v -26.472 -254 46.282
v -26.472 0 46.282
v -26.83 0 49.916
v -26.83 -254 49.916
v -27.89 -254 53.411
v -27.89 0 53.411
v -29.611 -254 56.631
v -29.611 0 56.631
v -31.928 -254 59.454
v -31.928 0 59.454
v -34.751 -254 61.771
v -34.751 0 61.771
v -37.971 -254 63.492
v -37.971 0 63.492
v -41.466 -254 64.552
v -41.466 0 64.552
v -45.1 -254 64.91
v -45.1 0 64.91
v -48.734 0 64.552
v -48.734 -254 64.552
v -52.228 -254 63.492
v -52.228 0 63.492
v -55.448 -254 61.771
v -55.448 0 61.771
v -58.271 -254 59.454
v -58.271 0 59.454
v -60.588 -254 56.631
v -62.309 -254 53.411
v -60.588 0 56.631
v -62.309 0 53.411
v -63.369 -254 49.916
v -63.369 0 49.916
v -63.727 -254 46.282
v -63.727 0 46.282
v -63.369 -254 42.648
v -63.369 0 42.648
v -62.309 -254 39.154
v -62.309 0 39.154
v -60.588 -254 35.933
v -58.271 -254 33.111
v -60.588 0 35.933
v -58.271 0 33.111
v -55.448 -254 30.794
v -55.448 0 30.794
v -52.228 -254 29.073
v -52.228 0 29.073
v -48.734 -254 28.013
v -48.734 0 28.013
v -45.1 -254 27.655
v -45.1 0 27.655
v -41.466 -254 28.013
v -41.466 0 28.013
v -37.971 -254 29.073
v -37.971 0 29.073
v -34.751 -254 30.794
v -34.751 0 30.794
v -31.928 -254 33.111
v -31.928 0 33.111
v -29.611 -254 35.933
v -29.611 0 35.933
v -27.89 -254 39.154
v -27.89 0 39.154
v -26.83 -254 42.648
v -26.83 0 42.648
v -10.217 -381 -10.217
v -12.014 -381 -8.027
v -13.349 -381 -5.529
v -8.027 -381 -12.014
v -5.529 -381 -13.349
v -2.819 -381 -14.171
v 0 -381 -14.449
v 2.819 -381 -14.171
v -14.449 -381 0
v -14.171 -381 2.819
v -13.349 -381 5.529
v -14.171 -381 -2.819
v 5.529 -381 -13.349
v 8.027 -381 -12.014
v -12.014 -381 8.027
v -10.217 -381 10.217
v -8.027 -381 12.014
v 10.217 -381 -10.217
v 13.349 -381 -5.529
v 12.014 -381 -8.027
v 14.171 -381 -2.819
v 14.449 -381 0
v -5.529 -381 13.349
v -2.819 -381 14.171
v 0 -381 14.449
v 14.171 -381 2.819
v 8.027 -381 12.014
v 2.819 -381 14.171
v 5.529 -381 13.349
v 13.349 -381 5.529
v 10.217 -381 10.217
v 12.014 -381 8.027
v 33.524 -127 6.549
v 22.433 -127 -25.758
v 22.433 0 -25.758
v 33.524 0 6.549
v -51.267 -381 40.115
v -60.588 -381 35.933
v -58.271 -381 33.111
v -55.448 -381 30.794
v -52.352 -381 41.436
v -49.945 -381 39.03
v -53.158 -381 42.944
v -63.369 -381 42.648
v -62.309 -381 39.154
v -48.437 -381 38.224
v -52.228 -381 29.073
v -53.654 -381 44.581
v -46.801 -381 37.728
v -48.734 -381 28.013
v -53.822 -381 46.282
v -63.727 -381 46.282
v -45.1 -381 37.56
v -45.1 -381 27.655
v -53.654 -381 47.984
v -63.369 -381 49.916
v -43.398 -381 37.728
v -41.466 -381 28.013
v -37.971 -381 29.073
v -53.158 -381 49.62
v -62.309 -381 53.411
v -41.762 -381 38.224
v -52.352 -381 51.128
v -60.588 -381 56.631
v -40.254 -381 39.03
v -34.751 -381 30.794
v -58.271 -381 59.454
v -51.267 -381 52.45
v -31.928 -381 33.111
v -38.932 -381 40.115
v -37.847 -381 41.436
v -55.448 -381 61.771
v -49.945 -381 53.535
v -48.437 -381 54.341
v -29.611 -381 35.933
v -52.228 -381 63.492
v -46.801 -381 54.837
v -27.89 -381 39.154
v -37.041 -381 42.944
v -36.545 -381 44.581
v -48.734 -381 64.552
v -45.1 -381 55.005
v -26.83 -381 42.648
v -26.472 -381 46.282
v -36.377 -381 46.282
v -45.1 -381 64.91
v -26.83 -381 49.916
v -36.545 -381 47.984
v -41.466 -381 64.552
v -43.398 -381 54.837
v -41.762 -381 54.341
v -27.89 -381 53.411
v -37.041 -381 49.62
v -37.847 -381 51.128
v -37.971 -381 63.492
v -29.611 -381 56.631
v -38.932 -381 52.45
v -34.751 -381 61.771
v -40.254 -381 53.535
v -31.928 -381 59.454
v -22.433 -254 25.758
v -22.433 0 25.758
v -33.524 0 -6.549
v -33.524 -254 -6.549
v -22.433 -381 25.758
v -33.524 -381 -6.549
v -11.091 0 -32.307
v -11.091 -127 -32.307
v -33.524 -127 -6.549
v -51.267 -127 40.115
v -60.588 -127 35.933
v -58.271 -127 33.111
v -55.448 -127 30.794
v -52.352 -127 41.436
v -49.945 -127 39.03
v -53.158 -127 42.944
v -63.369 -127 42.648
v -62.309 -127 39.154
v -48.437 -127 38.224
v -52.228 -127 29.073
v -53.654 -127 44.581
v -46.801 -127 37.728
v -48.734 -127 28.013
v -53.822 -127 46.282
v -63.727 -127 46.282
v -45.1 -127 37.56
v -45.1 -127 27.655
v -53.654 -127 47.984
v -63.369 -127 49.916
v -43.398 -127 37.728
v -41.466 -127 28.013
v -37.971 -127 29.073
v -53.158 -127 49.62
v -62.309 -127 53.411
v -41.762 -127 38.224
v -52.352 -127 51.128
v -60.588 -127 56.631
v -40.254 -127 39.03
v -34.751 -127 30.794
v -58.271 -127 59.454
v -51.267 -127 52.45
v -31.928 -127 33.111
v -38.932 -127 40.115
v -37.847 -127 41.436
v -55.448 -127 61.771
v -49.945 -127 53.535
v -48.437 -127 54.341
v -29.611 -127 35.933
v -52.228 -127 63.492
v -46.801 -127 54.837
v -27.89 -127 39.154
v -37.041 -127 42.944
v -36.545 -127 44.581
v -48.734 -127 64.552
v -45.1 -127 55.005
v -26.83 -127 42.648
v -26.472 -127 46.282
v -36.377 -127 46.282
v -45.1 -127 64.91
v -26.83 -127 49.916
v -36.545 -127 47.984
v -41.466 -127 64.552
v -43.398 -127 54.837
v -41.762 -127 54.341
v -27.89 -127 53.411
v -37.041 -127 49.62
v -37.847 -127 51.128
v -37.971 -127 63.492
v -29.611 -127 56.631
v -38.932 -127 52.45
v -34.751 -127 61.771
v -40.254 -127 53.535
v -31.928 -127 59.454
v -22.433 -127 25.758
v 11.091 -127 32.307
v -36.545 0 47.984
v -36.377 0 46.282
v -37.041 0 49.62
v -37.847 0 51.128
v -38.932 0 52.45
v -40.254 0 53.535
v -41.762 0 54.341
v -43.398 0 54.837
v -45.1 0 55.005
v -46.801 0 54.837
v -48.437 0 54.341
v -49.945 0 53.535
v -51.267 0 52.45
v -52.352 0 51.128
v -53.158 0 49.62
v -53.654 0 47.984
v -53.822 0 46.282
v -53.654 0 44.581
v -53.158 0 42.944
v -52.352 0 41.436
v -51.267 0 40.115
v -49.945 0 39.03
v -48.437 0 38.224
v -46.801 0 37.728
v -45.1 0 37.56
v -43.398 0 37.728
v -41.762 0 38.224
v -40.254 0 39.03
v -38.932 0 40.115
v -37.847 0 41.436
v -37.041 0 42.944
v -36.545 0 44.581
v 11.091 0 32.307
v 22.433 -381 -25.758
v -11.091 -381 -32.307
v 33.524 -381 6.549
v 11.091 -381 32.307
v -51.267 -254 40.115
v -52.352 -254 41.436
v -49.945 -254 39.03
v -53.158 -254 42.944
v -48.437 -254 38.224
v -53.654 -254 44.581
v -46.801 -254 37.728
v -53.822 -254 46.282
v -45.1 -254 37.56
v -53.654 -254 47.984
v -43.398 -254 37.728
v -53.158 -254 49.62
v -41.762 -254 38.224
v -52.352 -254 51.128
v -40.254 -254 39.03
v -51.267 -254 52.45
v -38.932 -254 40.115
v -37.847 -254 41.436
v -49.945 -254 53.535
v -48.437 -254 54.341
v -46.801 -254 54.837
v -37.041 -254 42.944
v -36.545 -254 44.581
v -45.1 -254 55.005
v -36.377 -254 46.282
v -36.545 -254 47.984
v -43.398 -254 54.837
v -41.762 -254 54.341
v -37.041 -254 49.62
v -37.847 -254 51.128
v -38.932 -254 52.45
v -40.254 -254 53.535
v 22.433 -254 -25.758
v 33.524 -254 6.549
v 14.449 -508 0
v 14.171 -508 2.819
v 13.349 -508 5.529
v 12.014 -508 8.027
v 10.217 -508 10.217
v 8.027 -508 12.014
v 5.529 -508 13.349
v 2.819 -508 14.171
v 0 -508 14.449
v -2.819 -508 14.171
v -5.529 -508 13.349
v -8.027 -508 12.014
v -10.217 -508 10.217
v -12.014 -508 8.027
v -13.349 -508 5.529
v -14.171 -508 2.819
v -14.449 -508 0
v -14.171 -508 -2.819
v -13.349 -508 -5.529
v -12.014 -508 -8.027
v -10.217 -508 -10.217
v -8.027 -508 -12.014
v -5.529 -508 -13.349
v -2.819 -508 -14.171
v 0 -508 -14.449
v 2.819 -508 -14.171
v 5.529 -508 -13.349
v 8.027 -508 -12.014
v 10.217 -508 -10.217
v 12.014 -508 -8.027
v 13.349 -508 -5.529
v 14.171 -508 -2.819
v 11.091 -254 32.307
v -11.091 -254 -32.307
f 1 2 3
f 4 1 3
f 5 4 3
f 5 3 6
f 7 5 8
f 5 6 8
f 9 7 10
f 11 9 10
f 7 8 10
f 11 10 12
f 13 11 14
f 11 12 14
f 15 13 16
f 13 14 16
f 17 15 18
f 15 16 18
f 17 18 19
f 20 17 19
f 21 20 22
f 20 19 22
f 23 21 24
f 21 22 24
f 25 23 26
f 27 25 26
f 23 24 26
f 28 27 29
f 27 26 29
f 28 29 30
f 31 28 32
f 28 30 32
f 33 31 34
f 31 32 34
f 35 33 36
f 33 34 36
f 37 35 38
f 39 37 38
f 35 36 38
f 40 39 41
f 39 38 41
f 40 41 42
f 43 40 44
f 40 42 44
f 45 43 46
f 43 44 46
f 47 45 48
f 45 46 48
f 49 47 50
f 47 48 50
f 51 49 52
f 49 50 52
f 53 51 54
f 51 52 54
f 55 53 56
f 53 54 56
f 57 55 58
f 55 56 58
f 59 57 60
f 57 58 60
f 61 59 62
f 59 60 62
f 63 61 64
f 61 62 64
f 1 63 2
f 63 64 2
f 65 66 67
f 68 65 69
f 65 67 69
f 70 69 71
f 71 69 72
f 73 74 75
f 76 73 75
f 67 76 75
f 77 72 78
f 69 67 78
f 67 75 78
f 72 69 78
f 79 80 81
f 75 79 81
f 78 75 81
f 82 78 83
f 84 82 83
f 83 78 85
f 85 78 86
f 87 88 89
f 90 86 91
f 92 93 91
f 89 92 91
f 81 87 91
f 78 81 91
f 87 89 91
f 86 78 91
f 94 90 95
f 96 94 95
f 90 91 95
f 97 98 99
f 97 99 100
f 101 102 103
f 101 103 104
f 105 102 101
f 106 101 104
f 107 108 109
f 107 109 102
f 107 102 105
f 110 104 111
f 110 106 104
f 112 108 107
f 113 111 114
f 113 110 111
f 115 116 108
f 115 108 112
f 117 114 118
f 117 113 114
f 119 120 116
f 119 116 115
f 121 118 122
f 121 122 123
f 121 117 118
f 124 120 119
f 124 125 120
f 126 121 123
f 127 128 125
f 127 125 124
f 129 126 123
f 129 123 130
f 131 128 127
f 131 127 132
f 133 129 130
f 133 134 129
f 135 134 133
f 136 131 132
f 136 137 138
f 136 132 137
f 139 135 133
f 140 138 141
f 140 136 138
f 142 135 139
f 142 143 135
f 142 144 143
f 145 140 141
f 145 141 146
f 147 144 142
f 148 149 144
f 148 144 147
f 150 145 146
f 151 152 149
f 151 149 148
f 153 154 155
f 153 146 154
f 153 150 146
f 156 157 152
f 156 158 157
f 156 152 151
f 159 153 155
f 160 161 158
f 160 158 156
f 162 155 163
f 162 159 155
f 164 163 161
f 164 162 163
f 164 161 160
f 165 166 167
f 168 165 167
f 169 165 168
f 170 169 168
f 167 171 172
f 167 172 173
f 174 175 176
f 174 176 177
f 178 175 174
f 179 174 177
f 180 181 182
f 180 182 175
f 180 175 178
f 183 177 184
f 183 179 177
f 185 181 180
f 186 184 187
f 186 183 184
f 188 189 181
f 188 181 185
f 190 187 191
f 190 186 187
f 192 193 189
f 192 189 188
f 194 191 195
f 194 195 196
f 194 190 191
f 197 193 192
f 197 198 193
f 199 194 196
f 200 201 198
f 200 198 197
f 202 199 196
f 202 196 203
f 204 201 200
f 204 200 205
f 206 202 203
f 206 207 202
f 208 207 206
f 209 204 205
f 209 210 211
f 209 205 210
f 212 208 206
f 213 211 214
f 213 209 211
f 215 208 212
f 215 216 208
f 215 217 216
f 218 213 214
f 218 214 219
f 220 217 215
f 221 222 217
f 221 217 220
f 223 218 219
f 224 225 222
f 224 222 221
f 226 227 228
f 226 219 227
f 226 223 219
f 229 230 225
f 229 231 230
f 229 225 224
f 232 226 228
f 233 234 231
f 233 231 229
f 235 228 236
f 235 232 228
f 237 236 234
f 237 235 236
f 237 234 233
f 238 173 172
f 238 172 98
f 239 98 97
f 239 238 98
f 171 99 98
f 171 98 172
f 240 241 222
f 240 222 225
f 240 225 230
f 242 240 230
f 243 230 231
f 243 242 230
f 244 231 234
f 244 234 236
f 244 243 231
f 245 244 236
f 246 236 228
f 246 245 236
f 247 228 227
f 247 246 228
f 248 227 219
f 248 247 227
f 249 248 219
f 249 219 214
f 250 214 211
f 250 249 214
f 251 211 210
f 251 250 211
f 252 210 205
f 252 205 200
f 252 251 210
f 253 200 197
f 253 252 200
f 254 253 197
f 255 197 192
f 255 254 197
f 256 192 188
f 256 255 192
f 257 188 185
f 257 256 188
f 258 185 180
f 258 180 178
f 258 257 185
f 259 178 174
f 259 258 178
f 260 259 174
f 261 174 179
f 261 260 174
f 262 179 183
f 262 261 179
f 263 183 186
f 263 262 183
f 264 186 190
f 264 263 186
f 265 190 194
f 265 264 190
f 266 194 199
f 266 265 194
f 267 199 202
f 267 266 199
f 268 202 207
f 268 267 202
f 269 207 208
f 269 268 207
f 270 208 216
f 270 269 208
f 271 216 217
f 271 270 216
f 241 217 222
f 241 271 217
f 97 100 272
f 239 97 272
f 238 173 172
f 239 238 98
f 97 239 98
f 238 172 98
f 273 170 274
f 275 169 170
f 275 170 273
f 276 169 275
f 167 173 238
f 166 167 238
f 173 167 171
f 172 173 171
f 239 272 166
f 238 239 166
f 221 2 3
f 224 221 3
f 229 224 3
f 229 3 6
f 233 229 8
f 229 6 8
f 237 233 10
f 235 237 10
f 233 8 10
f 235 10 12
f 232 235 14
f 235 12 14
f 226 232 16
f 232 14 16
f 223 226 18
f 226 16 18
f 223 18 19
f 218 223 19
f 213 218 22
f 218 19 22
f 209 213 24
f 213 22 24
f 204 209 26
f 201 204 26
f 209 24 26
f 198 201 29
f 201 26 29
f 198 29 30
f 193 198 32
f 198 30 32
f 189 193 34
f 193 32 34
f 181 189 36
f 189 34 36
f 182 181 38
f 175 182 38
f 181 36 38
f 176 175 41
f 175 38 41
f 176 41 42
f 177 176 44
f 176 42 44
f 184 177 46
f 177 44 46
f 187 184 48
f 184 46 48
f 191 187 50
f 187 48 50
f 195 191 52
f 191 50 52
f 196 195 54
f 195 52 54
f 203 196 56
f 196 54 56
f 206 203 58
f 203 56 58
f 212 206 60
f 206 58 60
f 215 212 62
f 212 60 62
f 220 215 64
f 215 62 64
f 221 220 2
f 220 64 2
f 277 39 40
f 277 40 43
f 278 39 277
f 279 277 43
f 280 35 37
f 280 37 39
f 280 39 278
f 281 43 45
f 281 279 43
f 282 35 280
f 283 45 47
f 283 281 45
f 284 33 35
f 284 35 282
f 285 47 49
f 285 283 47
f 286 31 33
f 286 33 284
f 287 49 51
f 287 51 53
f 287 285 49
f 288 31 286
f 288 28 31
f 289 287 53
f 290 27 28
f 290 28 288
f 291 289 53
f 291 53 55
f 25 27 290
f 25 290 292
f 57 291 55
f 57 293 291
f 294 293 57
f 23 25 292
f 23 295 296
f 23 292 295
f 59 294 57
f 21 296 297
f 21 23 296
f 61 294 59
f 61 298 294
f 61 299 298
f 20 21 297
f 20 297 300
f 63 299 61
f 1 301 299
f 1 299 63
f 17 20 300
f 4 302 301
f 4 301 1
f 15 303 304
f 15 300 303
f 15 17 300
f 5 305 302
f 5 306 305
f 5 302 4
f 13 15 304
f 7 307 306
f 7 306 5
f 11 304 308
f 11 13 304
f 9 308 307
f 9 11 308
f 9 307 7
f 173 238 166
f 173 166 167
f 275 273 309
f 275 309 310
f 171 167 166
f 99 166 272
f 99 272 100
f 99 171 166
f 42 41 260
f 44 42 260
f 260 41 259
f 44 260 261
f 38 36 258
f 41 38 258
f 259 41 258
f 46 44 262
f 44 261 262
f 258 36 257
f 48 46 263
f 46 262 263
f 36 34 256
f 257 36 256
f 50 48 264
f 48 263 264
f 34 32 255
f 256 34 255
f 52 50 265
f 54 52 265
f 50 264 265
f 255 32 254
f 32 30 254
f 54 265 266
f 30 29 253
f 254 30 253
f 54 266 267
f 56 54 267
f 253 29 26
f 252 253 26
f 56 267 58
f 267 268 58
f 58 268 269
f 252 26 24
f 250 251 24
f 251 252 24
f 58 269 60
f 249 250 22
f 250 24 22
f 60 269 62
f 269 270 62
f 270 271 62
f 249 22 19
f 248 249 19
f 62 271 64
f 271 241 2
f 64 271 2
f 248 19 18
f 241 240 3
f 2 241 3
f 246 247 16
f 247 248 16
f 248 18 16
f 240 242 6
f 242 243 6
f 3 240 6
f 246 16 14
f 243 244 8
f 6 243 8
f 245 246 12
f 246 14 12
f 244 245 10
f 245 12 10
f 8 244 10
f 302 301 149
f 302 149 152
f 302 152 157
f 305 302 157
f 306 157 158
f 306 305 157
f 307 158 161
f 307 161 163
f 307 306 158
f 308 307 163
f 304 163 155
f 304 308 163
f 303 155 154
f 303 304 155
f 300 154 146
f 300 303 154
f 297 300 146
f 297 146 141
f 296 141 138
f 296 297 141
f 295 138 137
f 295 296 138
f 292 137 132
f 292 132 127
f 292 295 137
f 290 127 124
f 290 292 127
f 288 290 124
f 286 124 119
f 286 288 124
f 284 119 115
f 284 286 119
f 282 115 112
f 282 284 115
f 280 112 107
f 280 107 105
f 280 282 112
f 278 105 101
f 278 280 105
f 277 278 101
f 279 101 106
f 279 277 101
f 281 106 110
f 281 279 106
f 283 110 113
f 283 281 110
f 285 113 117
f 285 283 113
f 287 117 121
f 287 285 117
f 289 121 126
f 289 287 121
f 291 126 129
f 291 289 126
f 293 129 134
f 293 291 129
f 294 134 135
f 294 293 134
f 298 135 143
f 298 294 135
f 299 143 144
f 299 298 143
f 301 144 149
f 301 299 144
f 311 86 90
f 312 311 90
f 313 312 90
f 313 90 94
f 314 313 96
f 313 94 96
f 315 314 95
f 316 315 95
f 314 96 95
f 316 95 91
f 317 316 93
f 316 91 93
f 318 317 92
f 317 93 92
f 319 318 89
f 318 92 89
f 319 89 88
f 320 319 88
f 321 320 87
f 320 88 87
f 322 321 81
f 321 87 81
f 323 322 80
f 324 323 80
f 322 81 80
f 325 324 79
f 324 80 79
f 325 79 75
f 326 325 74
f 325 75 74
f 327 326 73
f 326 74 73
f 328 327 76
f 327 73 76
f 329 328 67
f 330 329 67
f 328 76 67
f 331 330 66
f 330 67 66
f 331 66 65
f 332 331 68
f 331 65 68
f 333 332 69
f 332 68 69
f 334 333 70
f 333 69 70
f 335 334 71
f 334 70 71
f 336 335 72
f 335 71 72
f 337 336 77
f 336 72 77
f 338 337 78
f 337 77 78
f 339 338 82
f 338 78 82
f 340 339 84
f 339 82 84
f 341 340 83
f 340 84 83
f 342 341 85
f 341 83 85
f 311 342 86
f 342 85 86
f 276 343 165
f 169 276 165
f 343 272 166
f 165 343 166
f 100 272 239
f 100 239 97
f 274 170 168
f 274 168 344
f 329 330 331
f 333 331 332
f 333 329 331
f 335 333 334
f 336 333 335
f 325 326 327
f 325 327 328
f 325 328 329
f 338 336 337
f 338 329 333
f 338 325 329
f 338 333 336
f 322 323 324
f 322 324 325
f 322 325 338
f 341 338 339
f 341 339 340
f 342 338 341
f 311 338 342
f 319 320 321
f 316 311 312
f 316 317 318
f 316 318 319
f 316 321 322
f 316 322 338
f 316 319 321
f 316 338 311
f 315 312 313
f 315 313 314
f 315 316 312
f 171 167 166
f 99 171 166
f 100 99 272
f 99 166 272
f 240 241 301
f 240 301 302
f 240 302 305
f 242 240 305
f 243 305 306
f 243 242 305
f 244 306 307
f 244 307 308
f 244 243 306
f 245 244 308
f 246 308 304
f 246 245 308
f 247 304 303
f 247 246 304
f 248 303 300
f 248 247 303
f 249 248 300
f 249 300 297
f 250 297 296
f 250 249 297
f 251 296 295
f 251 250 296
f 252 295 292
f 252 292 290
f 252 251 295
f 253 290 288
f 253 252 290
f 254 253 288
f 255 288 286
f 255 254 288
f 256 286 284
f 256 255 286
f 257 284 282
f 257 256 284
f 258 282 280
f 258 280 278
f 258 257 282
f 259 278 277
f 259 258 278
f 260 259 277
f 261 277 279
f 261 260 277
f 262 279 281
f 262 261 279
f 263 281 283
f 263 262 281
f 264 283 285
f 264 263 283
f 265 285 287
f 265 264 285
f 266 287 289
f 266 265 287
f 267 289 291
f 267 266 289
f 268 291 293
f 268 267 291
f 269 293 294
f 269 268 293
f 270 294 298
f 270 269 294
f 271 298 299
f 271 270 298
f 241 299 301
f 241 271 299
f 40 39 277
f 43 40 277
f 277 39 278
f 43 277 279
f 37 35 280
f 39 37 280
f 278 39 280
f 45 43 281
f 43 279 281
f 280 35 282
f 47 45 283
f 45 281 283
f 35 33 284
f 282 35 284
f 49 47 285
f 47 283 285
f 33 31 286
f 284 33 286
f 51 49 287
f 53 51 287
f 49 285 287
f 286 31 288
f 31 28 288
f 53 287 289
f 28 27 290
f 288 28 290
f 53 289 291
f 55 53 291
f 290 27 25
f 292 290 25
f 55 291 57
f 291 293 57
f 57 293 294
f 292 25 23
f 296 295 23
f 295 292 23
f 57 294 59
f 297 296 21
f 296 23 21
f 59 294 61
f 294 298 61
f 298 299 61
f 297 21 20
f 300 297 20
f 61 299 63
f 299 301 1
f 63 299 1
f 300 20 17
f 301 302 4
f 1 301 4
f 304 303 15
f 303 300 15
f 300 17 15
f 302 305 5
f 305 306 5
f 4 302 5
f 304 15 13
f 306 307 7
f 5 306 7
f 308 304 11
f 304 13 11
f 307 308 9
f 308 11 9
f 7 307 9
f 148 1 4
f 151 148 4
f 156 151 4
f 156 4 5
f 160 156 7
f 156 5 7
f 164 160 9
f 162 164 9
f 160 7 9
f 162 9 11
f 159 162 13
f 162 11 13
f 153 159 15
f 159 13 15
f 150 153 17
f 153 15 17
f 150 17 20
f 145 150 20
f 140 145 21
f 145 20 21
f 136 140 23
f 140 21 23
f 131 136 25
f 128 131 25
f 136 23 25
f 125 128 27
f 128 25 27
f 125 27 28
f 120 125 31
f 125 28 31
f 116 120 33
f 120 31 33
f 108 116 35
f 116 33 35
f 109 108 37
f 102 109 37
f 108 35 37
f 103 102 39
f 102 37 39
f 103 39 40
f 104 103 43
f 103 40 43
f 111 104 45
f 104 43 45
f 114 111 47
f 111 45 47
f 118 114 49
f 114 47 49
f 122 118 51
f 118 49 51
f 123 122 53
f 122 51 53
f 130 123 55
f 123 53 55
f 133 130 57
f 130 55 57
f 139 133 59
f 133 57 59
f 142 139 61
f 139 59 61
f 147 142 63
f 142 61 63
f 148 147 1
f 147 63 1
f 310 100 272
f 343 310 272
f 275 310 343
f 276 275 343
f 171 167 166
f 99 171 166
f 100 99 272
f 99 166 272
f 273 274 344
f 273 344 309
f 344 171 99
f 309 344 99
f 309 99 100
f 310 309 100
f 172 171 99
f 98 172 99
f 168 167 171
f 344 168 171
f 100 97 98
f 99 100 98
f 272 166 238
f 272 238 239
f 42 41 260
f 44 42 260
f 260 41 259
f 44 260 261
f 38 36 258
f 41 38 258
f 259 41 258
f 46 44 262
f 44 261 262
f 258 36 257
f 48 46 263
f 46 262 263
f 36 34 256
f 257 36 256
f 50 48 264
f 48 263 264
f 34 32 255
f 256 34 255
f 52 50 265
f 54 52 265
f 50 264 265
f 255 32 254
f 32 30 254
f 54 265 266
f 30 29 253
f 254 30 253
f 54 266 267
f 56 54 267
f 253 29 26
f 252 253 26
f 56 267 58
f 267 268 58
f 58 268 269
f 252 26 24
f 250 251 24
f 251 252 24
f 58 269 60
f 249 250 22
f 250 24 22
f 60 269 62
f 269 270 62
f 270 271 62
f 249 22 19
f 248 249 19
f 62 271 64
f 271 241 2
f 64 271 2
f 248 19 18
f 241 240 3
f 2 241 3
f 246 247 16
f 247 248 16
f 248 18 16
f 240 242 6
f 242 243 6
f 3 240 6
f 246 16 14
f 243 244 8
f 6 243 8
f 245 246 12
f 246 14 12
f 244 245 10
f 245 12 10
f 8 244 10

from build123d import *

# Parameters (mm, degrees)
F1_DEPTH = 254
F0_R     = 18.6275130074
F0_R_2   = 8.7223710734
F2_R     = 17.1106148406
F2_R_2   = 18.6275130074
F2_R_3   = 8.7223710734
F3_DEPTH = 127
F4_DEPTH = 127
F6_R     = 14.4488141118
F7_DEPTH = 127


with BuildPart() as f1:
    # F0 (on Front) → F1 (new body)
    with BuildSketch(Plane.XZ):
        Polygon((11.0906781218, 32.3066629883), (-22.4330517984, 25.7581404928), (-33.5237299203, -6.5485224954), (-11.0906781218, -32.3066629883), (22.4330517984, -25.7581404928), (33.5237299203, 6.5485224954), align=None)
    extrude(amount=F1_DEPTH)

    # F2 (on face) + F1_face (on face) → F3 (join)
    with BuildSketch(Plane.XZ.offset(254)):
        Circle(F2_R)
        with Locations((-45.0995638967, 46.2823174894)):
            Circle(F2_R_2)
        with Locations((-45.0995638967, 46.2823174894)):
            Circle(F2_R_3, mode=Mode.SUBTRACT)
    with BuildSketch(Plane(origin=(-45.0995638967, -254, 46.2823174894), x_dir=(1, 0, 0), z_dir=(0, -1, 0))):
        Polygon((56.1902420185, -13.9756545011), (22.6665120982, -20.5241769966), (11.5758339764, -52.8308399848), (34.0088857748, -78.5889804777), (67.5326156951, -72.0404579822), (78.6232938169, -39.733794994), align=None)
    extrude(amount=F3_DEPTH)


with BuildPart() as f1b:
    # F0 (on Front) → F1, piece 2 (new body)
    with BuildSketch(Plane.XZ):
        with Locations((-45.0995638967, 46.2823174894)):
            Circle(F0_R)
        with Locations((-45.0995638967, 46.2823174894)):
            Circle(F0_R_2, mode=Mode.SUBTRACT)
    extrude(amount=F1_DEPTH)


with BuildPart() as f4:
    # F0 (on Front) → F4 (new body)
    with BuildSketch(Plane.XZ):
        Polygon((11.0906781218, 32.3066629883), (-22.4330517984, 25.7581404928), (-33.5237299203, -6.5485224954), (-11.0906781218, -32.3066629883), (22.4330517984, -25.7581404928), (33.5237299203, 6.5485224954), align=None)
    extrude(amount=F4_DEPTH)


with BuildPart() as f4b:
    # F0 (on Front) → F4, piece 2 (new body)
    with BuildSketch(Plane.XZ):
        with Locations((-45.0995638967, 46.2823174894)):
            Circle(F0_R)
        with Locations((-45.0995638967, 46.2823174894)):
            Circle(F0_R_2, mode=Mode.SUBTRACT)
    extrude(amount=F4_DEPTH)


with BuildPart() as f7:
    # F6 (on face) + F1_face1 (on face) → F7 (new body)
    with BuildSketch(Plane.XZ.offset(381)):
        Circle(F6_R)
    with BuildSketch(Plane(origin=(0, 0, 0), x_dir=(1, 0, 0), z_dir=(0, 1, 0))):
        Polygon((-22.4330517984, -25.7581404928), (11.0906781218, -32.3066629883), (33.5237299203, -6.5485224954), (22.4330517984, 25.7581404928), (-11.0906781218, 32.3066629883), (-33.5237299203, 6.5485224954), align=None)
    extrude(amount=F7_DEPTH, dir=(0, -1, 0))


solid = Compound([f1.part, f1b.part, f4.part, f4b.part, f7.part])
